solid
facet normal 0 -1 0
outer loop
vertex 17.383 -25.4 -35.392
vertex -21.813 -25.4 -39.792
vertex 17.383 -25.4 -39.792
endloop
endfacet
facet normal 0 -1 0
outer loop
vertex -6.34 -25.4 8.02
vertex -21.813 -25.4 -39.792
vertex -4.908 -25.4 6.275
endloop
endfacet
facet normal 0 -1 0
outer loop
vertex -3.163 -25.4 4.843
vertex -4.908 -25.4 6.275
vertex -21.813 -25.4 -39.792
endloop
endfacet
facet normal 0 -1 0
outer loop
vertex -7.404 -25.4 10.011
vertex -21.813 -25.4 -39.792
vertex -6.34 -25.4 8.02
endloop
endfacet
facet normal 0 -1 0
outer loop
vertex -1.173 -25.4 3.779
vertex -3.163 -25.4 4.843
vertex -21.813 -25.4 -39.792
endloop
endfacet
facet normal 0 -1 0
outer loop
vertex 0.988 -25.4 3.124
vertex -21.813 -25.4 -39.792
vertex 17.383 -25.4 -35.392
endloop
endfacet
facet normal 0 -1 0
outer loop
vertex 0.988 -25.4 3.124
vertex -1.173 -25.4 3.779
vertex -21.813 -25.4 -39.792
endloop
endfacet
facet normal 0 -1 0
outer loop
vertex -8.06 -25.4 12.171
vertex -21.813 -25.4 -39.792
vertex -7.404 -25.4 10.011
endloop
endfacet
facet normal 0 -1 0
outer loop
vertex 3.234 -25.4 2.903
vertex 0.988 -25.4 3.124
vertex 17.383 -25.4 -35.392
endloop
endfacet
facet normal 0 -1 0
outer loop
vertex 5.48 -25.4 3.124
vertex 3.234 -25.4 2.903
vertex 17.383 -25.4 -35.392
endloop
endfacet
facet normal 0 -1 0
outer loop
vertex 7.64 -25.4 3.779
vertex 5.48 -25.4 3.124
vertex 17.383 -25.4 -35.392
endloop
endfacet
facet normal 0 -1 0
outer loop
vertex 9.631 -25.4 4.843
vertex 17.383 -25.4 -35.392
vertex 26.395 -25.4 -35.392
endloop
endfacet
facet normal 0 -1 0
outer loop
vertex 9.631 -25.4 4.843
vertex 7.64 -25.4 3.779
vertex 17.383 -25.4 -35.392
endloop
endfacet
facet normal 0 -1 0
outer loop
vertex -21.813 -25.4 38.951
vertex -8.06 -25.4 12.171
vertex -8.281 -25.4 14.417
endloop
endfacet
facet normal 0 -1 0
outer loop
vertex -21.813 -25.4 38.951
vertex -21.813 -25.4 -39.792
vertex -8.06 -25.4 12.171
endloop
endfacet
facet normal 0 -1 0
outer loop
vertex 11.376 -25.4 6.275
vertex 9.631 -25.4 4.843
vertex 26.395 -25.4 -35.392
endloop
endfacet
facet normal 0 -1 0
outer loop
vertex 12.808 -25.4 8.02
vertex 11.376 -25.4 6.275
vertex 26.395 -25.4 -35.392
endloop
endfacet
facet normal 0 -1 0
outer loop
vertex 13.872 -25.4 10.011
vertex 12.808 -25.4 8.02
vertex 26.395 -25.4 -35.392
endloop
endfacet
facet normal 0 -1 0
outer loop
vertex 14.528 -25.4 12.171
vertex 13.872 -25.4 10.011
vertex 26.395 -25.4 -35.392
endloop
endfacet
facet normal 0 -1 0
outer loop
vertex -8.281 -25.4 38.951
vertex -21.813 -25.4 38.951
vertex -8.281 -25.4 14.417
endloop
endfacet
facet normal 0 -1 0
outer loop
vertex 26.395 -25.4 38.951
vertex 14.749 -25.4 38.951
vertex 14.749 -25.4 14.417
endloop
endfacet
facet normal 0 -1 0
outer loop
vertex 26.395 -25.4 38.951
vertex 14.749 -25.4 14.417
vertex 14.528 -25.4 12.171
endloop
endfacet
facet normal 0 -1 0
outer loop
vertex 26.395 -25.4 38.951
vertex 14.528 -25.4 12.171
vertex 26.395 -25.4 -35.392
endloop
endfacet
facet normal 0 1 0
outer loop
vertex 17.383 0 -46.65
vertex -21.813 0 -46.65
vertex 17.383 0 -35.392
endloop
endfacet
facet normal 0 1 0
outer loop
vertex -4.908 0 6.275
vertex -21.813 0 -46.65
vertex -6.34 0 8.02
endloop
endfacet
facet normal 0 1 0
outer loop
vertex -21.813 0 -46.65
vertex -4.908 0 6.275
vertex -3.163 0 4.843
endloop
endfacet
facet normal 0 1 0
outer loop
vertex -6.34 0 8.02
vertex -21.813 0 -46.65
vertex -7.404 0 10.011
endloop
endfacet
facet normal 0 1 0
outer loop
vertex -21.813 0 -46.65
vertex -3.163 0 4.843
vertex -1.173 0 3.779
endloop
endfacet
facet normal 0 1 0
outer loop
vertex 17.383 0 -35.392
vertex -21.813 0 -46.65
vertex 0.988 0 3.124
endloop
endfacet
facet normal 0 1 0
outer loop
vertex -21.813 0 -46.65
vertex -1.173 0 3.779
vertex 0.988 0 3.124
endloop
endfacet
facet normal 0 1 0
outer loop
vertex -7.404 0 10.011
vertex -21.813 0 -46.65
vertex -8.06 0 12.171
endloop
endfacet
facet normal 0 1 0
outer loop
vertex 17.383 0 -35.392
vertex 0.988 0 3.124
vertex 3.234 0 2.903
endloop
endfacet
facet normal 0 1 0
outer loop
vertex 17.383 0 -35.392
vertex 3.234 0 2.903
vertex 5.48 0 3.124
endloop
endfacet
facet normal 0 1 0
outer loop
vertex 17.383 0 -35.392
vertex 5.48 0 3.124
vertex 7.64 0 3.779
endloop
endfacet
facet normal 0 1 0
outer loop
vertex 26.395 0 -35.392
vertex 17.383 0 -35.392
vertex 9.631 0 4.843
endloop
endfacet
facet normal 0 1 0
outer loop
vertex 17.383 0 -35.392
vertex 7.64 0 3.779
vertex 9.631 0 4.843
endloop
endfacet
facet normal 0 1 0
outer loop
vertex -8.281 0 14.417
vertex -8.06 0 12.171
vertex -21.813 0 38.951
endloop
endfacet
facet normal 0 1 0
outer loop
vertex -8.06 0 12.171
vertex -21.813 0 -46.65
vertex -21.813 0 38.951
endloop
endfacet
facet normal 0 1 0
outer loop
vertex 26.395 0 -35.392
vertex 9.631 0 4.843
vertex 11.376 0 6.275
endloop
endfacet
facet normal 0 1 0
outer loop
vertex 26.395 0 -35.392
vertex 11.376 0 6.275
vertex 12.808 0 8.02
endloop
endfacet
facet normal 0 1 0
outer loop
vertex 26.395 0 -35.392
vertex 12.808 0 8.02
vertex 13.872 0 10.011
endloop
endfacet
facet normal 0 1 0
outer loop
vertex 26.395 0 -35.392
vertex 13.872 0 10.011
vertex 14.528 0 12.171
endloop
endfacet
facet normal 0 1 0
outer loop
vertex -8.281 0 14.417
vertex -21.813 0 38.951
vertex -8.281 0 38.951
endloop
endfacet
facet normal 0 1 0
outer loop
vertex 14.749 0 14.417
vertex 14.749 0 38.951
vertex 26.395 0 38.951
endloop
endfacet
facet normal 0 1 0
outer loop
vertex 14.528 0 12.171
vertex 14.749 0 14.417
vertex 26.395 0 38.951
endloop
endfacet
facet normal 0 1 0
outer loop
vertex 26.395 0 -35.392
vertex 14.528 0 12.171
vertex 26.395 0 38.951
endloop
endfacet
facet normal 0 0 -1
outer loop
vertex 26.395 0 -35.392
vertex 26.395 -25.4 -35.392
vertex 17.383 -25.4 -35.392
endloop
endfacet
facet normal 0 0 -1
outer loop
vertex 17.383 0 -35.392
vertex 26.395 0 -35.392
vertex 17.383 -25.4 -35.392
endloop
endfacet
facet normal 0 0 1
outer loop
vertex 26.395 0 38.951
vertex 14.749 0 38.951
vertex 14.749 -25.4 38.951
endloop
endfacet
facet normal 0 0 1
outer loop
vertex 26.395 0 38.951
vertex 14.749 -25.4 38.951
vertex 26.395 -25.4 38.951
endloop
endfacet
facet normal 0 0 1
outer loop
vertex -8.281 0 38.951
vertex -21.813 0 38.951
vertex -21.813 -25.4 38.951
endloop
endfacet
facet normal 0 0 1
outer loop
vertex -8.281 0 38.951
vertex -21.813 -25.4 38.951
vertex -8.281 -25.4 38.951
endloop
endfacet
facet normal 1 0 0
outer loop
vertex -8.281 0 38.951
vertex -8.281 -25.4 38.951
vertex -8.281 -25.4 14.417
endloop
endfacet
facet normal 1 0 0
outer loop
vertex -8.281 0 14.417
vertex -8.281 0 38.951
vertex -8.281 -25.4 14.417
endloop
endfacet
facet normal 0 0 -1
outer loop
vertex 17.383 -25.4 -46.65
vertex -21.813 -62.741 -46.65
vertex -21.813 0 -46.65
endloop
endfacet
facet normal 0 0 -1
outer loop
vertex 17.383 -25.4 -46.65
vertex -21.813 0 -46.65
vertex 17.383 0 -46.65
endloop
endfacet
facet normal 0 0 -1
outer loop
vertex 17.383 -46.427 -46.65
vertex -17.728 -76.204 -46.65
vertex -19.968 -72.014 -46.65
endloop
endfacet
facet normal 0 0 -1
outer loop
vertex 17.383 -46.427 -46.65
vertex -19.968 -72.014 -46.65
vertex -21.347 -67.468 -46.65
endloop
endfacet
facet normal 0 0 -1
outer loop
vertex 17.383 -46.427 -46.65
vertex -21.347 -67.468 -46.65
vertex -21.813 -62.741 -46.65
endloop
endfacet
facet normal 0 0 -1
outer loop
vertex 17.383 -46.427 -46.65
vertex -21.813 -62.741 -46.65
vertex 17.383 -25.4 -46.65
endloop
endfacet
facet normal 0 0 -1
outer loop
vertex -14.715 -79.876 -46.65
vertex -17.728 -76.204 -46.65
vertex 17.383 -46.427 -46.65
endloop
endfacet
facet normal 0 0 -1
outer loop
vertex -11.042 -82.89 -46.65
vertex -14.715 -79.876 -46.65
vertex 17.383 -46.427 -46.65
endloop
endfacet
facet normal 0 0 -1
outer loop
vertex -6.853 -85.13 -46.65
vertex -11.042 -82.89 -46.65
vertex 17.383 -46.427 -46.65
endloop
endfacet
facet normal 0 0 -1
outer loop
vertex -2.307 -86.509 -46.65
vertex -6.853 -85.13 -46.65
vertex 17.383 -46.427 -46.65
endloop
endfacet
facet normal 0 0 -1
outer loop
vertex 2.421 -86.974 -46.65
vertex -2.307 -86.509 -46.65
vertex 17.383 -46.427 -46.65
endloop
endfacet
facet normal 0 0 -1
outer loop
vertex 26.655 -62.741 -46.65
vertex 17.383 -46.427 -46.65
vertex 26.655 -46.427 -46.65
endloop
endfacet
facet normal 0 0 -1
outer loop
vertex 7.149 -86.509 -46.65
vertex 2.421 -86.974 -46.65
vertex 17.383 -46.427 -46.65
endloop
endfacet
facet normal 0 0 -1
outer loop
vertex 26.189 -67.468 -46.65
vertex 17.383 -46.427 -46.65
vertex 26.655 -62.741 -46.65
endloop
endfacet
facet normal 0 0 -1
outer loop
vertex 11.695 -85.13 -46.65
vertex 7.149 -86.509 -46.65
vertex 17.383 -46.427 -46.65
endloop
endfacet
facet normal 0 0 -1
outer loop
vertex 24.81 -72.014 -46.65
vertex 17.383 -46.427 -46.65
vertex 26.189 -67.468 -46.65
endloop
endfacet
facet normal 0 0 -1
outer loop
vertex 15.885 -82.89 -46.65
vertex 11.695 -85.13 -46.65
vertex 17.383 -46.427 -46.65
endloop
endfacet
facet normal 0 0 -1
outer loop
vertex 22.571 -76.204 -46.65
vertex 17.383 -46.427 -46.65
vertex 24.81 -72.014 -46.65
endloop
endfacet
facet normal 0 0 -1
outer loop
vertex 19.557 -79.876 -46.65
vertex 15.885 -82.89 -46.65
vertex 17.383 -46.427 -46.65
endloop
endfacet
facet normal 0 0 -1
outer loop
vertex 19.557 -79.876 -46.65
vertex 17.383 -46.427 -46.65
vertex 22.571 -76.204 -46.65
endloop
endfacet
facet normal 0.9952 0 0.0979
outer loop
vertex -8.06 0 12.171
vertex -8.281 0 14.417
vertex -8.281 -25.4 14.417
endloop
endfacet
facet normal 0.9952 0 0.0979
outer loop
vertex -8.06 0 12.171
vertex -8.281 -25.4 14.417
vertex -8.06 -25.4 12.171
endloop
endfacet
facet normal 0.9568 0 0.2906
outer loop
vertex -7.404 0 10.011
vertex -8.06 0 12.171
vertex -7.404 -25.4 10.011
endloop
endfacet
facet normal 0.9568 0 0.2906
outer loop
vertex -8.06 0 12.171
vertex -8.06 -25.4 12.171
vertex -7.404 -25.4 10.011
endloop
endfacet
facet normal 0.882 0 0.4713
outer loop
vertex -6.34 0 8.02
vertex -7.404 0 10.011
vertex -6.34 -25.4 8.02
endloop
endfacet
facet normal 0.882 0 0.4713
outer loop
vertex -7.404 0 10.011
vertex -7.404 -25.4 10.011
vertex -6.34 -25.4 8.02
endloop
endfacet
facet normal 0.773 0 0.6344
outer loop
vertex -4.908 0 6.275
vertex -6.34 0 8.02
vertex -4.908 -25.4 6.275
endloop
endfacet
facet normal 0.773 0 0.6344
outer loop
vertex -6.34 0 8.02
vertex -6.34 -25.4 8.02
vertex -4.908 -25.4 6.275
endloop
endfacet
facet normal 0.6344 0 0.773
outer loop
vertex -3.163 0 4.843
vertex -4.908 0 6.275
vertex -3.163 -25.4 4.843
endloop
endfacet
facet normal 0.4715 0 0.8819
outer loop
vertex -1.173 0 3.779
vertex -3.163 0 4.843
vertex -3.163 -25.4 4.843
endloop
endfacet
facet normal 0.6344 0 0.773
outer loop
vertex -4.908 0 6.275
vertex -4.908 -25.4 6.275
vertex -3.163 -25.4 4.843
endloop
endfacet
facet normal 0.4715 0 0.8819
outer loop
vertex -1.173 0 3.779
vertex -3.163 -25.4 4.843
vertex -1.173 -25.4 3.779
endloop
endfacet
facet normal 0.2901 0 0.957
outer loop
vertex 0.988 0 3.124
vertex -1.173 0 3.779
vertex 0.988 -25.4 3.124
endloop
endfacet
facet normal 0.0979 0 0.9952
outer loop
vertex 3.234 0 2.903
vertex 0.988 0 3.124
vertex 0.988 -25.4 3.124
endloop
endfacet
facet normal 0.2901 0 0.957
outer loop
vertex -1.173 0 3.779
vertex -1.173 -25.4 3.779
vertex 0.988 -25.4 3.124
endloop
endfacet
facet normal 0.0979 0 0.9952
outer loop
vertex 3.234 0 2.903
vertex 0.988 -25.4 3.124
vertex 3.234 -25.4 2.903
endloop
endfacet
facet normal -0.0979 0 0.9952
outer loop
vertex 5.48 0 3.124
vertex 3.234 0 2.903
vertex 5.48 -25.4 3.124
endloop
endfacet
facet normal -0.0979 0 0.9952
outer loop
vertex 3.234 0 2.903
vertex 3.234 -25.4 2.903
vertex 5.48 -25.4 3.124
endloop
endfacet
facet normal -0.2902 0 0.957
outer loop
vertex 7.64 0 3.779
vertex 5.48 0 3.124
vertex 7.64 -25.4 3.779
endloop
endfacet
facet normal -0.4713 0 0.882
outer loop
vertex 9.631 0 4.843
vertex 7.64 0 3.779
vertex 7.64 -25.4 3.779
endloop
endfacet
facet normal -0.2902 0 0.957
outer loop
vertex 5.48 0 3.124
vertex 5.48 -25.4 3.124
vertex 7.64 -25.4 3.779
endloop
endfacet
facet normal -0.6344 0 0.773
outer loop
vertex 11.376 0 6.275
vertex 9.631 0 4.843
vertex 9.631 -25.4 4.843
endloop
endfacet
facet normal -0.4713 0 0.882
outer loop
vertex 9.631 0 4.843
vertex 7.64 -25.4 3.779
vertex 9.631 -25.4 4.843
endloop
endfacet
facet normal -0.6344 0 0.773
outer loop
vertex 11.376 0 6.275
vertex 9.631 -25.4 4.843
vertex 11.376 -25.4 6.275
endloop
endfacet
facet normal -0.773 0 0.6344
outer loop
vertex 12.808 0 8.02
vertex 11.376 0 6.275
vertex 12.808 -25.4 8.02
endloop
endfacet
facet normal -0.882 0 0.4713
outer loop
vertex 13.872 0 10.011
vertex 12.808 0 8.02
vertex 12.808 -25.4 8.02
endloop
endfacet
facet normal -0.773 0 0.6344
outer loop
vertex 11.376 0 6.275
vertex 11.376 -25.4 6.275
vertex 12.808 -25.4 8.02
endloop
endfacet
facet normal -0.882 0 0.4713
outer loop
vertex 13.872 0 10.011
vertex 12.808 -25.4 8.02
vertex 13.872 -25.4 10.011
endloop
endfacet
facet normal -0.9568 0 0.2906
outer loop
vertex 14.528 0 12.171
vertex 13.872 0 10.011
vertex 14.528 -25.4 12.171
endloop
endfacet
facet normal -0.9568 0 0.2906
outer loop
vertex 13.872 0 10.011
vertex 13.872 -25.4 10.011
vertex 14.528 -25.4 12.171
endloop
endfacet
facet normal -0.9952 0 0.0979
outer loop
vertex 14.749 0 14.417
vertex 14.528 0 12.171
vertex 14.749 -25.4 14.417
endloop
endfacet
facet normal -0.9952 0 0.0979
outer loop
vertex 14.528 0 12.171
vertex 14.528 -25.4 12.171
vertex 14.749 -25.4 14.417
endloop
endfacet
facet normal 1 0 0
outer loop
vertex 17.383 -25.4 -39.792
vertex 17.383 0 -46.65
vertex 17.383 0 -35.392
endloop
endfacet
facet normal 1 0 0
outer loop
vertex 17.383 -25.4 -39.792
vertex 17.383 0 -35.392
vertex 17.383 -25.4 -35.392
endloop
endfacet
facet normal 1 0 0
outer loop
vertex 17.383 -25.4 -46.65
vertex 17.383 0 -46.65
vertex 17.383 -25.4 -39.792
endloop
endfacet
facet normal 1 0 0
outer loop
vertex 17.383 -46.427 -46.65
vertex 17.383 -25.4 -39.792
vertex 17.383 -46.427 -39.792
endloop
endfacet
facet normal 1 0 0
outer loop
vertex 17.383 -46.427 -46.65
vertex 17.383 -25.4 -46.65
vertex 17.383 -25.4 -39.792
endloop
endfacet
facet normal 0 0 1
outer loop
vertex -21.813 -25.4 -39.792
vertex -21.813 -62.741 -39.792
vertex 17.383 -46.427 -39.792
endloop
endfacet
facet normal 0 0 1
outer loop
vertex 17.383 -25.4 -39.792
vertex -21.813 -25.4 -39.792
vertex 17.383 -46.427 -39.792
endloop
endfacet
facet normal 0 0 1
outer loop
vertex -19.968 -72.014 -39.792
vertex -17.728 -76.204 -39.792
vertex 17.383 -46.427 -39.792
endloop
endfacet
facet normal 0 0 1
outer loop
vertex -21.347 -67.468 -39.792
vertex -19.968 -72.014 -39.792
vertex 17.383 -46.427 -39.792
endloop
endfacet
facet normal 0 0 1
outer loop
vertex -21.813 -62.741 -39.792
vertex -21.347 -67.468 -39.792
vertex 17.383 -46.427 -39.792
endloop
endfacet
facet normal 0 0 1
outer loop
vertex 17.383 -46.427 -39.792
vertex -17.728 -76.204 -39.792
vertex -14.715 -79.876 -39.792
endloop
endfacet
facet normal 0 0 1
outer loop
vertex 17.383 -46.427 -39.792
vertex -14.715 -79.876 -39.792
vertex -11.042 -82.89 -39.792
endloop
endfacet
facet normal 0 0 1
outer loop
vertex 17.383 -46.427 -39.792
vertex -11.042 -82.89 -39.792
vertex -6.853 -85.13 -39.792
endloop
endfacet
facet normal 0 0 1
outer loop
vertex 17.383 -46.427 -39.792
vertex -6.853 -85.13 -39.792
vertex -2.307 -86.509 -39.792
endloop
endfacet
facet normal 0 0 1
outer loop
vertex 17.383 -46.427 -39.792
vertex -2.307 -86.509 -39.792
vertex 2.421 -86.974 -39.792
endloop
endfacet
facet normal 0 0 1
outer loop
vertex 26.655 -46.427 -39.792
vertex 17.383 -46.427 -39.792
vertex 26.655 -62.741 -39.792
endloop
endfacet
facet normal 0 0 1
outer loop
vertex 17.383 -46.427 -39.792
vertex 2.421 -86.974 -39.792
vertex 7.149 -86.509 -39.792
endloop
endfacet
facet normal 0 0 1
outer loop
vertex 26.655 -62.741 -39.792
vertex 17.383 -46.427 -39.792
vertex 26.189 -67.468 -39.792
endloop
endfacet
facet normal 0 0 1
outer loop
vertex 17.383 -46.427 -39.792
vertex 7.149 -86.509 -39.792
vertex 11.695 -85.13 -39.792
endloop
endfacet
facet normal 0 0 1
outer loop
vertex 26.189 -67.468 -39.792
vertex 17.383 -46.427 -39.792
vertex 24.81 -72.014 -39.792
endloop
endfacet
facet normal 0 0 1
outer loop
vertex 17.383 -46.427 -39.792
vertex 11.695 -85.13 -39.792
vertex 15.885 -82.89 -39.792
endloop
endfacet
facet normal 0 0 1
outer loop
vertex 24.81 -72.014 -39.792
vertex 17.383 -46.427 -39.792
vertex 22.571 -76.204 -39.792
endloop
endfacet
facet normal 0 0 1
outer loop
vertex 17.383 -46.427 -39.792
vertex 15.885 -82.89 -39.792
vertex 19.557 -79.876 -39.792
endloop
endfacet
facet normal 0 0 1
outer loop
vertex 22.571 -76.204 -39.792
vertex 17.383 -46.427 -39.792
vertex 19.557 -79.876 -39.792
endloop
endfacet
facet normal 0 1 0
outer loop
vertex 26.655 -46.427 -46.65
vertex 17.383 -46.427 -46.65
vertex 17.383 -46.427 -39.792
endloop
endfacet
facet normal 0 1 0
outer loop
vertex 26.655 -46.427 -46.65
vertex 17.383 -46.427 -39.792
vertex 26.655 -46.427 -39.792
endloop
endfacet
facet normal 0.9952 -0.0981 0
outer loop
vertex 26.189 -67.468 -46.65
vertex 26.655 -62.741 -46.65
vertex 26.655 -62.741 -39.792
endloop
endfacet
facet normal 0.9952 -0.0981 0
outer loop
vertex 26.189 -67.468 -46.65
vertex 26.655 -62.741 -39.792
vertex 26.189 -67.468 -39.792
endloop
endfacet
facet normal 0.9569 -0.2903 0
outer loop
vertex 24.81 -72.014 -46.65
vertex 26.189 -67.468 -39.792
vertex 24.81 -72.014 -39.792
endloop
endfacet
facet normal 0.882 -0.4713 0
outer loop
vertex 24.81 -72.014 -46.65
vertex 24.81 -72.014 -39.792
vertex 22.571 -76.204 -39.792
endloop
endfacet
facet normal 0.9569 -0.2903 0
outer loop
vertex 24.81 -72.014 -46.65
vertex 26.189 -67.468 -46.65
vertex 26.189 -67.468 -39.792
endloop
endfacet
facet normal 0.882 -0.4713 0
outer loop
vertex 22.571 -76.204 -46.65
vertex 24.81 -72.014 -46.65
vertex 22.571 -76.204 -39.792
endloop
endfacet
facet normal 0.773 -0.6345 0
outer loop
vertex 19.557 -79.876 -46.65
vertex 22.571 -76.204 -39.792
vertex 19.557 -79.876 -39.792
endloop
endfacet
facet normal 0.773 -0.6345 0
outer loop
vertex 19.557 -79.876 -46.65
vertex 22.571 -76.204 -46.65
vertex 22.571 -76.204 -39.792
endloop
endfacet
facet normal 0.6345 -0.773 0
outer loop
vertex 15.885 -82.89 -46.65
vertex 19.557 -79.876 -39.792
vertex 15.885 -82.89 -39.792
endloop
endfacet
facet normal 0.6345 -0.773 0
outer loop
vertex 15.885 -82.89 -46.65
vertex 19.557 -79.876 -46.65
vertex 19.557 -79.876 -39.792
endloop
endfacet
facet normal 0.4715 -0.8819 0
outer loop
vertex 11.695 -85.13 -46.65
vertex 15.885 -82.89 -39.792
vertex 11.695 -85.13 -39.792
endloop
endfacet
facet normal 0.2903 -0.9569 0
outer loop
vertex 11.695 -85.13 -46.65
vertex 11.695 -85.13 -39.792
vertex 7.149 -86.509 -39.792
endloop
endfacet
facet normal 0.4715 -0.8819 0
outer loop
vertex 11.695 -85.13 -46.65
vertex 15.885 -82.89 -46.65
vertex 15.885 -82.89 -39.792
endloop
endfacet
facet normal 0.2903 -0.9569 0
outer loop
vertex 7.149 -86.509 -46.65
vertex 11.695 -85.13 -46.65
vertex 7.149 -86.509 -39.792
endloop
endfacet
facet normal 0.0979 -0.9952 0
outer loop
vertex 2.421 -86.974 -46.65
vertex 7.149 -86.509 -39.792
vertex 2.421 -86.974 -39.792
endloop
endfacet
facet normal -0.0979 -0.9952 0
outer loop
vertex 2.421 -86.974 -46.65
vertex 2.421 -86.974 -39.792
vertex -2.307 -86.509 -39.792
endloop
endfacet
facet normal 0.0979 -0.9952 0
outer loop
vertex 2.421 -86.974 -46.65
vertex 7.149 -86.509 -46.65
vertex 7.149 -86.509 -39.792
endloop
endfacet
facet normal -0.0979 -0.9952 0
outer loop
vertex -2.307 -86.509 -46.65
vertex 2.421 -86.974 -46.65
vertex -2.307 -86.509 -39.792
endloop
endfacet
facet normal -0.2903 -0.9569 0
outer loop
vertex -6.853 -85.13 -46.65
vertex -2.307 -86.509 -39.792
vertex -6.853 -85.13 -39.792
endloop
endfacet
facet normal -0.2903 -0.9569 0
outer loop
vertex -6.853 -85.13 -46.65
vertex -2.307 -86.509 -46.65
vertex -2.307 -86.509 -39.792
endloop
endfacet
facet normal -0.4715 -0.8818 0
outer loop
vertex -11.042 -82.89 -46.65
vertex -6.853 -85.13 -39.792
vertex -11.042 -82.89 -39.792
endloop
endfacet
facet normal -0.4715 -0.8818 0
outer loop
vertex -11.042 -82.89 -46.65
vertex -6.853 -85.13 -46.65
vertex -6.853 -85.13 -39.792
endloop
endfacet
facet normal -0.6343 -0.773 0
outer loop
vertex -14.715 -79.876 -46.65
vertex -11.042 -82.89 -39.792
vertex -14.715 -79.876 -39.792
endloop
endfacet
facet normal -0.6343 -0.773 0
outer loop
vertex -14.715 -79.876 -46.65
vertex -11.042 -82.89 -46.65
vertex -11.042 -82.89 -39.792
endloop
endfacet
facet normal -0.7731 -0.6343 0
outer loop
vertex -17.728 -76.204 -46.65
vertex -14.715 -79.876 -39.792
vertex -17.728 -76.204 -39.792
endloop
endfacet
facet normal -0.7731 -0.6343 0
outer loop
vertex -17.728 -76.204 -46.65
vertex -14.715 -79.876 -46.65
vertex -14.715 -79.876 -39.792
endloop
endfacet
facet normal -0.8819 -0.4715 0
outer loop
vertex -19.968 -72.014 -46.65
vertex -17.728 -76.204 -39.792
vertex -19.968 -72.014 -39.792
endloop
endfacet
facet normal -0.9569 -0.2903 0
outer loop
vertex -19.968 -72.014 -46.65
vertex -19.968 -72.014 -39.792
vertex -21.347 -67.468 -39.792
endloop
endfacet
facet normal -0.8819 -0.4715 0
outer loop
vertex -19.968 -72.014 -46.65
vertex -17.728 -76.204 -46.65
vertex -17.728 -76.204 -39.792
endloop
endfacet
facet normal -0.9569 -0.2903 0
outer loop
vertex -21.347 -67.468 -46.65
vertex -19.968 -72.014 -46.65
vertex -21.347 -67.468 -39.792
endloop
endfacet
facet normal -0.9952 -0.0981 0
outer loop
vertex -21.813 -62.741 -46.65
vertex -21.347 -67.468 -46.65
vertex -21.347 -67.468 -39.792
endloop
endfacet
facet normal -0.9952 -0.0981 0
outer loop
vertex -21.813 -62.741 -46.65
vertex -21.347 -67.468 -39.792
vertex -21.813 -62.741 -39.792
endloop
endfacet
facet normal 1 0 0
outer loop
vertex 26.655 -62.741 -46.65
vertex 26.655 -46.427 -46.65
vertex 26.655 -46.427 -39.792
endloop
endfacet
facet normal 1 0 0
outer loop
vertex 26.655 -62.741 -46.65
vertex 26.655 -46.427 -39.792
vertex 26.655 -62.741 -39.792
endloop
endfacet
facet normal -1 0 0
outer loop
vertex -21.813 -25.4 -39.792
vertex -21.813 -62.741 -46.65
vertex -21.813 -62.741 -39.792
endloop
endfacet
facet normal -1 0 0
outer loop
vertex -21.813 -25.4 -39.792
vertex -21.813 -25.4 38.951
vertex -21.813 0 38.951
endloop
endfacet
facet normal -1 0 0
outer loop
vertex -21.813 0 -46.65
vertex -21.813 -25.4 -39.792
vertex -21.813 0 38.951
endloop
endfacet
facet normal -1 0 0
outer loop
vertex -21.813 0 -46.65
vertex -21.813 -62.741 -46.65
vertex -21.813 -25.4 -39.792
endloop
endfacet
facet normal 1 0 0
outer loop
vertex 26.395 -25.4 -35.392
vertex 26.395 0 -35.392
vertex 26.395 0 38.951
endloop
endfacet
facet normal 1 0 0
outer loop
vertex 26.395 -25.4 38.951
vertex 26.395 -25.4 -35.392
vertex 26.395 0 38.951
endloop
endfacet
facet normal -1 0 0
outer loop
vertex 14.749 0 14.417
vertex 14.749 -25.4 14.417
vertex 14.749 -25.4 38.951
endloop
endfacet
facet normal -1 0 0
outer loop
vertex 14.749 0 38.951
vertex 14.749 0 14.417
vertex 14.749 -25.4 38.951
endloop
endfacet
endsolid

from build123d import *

# Parameters (mm, degrees)
F0_W     = 48.2076276094
F0_H     = 85.6006219983
F1_DEPTH = 25.4
F3_DEPTH = 25.4
F4_W     = 10.3362295777
F4_H     = 11.2576633692
F4_W_2   = 2.2321604192
F5_DEPTH = 25.4
F7_DEPTH = 6.858


with BuildPart() as f1:
    # F0 (on Front) → F1 (new body)
    with BuildSketch(Plane.XZ):
        with Locations((2.2912370041, -3.8492791355)):
            Rectangle(F0_W, F0_H)
    extrude(amount=F1_DEPTH)

    # F2 (on face) → F3 (cut)
    with BuildSketch(Plane.XZ.offset(25.4)):
        with BuildLine():
            Line((14.7487549111, 38.9510318637), (-8.2807904109, 38.9510318637))
            Line((-8.2807904109, 38.9510318637), (-8.2807904109, 14.4174993038))
            ThreePointArc((-8.2807904109, 14.4174993038), (3.2339822501, 2.9027266428), (14.7487549111, 14.4174993038))
            Line((14.7487549111, 14.4174993038), (14.7487549111, 38.9510318637))
        make_face()
    extrude(amount=-F3_DEPTH, mode=Mode.SUBTRACT)

    # F4 (on face) → F5 (cut)
    with BuildSketch(Plane.XZ.offset(25.4)):
        with Locations((22.5512860343, -41.02075845)):
            Rectangle(F4_W, F4_H)
        with Locations((28.8354810327, -41.02075845)):
            Rectangle(F4_W_2, F4_H)
    extrude(amount=-F5_DEPTH, mode=Mode.SUBTRACT)

    # F6 (on face) → F7 (join)
    with BuildSketch(Plane(origin=(0, 0, -46.6495901346), x_dir=(1, 0, 0), z_dir=(0, 0, -1))):
        with BuildLine():
            Line((-21.8125768006, 62.740623951), (-21.8125768006, 25.4))
            Line((-21.8125768006, 25.4), (17.3831712455, 25.4))
            Line((17.3831712455, 25.4), (17.3831712455, 46.4270114899))
            Line((17.3831712455, 46.4270114899), (26.6548879445, 46.4270114899))
            Line((26.6548879445, 46.4270114899), (26.6548879445, 62.740623951))
            ThreePointArc((26.6548879445, 62.740623951), (2.4211555719, 86.9743563235), (-21.8125768006, 62.740623951))
        make_face()
    extrude(amount=-F7_DEPTH)


solid = f1.part
